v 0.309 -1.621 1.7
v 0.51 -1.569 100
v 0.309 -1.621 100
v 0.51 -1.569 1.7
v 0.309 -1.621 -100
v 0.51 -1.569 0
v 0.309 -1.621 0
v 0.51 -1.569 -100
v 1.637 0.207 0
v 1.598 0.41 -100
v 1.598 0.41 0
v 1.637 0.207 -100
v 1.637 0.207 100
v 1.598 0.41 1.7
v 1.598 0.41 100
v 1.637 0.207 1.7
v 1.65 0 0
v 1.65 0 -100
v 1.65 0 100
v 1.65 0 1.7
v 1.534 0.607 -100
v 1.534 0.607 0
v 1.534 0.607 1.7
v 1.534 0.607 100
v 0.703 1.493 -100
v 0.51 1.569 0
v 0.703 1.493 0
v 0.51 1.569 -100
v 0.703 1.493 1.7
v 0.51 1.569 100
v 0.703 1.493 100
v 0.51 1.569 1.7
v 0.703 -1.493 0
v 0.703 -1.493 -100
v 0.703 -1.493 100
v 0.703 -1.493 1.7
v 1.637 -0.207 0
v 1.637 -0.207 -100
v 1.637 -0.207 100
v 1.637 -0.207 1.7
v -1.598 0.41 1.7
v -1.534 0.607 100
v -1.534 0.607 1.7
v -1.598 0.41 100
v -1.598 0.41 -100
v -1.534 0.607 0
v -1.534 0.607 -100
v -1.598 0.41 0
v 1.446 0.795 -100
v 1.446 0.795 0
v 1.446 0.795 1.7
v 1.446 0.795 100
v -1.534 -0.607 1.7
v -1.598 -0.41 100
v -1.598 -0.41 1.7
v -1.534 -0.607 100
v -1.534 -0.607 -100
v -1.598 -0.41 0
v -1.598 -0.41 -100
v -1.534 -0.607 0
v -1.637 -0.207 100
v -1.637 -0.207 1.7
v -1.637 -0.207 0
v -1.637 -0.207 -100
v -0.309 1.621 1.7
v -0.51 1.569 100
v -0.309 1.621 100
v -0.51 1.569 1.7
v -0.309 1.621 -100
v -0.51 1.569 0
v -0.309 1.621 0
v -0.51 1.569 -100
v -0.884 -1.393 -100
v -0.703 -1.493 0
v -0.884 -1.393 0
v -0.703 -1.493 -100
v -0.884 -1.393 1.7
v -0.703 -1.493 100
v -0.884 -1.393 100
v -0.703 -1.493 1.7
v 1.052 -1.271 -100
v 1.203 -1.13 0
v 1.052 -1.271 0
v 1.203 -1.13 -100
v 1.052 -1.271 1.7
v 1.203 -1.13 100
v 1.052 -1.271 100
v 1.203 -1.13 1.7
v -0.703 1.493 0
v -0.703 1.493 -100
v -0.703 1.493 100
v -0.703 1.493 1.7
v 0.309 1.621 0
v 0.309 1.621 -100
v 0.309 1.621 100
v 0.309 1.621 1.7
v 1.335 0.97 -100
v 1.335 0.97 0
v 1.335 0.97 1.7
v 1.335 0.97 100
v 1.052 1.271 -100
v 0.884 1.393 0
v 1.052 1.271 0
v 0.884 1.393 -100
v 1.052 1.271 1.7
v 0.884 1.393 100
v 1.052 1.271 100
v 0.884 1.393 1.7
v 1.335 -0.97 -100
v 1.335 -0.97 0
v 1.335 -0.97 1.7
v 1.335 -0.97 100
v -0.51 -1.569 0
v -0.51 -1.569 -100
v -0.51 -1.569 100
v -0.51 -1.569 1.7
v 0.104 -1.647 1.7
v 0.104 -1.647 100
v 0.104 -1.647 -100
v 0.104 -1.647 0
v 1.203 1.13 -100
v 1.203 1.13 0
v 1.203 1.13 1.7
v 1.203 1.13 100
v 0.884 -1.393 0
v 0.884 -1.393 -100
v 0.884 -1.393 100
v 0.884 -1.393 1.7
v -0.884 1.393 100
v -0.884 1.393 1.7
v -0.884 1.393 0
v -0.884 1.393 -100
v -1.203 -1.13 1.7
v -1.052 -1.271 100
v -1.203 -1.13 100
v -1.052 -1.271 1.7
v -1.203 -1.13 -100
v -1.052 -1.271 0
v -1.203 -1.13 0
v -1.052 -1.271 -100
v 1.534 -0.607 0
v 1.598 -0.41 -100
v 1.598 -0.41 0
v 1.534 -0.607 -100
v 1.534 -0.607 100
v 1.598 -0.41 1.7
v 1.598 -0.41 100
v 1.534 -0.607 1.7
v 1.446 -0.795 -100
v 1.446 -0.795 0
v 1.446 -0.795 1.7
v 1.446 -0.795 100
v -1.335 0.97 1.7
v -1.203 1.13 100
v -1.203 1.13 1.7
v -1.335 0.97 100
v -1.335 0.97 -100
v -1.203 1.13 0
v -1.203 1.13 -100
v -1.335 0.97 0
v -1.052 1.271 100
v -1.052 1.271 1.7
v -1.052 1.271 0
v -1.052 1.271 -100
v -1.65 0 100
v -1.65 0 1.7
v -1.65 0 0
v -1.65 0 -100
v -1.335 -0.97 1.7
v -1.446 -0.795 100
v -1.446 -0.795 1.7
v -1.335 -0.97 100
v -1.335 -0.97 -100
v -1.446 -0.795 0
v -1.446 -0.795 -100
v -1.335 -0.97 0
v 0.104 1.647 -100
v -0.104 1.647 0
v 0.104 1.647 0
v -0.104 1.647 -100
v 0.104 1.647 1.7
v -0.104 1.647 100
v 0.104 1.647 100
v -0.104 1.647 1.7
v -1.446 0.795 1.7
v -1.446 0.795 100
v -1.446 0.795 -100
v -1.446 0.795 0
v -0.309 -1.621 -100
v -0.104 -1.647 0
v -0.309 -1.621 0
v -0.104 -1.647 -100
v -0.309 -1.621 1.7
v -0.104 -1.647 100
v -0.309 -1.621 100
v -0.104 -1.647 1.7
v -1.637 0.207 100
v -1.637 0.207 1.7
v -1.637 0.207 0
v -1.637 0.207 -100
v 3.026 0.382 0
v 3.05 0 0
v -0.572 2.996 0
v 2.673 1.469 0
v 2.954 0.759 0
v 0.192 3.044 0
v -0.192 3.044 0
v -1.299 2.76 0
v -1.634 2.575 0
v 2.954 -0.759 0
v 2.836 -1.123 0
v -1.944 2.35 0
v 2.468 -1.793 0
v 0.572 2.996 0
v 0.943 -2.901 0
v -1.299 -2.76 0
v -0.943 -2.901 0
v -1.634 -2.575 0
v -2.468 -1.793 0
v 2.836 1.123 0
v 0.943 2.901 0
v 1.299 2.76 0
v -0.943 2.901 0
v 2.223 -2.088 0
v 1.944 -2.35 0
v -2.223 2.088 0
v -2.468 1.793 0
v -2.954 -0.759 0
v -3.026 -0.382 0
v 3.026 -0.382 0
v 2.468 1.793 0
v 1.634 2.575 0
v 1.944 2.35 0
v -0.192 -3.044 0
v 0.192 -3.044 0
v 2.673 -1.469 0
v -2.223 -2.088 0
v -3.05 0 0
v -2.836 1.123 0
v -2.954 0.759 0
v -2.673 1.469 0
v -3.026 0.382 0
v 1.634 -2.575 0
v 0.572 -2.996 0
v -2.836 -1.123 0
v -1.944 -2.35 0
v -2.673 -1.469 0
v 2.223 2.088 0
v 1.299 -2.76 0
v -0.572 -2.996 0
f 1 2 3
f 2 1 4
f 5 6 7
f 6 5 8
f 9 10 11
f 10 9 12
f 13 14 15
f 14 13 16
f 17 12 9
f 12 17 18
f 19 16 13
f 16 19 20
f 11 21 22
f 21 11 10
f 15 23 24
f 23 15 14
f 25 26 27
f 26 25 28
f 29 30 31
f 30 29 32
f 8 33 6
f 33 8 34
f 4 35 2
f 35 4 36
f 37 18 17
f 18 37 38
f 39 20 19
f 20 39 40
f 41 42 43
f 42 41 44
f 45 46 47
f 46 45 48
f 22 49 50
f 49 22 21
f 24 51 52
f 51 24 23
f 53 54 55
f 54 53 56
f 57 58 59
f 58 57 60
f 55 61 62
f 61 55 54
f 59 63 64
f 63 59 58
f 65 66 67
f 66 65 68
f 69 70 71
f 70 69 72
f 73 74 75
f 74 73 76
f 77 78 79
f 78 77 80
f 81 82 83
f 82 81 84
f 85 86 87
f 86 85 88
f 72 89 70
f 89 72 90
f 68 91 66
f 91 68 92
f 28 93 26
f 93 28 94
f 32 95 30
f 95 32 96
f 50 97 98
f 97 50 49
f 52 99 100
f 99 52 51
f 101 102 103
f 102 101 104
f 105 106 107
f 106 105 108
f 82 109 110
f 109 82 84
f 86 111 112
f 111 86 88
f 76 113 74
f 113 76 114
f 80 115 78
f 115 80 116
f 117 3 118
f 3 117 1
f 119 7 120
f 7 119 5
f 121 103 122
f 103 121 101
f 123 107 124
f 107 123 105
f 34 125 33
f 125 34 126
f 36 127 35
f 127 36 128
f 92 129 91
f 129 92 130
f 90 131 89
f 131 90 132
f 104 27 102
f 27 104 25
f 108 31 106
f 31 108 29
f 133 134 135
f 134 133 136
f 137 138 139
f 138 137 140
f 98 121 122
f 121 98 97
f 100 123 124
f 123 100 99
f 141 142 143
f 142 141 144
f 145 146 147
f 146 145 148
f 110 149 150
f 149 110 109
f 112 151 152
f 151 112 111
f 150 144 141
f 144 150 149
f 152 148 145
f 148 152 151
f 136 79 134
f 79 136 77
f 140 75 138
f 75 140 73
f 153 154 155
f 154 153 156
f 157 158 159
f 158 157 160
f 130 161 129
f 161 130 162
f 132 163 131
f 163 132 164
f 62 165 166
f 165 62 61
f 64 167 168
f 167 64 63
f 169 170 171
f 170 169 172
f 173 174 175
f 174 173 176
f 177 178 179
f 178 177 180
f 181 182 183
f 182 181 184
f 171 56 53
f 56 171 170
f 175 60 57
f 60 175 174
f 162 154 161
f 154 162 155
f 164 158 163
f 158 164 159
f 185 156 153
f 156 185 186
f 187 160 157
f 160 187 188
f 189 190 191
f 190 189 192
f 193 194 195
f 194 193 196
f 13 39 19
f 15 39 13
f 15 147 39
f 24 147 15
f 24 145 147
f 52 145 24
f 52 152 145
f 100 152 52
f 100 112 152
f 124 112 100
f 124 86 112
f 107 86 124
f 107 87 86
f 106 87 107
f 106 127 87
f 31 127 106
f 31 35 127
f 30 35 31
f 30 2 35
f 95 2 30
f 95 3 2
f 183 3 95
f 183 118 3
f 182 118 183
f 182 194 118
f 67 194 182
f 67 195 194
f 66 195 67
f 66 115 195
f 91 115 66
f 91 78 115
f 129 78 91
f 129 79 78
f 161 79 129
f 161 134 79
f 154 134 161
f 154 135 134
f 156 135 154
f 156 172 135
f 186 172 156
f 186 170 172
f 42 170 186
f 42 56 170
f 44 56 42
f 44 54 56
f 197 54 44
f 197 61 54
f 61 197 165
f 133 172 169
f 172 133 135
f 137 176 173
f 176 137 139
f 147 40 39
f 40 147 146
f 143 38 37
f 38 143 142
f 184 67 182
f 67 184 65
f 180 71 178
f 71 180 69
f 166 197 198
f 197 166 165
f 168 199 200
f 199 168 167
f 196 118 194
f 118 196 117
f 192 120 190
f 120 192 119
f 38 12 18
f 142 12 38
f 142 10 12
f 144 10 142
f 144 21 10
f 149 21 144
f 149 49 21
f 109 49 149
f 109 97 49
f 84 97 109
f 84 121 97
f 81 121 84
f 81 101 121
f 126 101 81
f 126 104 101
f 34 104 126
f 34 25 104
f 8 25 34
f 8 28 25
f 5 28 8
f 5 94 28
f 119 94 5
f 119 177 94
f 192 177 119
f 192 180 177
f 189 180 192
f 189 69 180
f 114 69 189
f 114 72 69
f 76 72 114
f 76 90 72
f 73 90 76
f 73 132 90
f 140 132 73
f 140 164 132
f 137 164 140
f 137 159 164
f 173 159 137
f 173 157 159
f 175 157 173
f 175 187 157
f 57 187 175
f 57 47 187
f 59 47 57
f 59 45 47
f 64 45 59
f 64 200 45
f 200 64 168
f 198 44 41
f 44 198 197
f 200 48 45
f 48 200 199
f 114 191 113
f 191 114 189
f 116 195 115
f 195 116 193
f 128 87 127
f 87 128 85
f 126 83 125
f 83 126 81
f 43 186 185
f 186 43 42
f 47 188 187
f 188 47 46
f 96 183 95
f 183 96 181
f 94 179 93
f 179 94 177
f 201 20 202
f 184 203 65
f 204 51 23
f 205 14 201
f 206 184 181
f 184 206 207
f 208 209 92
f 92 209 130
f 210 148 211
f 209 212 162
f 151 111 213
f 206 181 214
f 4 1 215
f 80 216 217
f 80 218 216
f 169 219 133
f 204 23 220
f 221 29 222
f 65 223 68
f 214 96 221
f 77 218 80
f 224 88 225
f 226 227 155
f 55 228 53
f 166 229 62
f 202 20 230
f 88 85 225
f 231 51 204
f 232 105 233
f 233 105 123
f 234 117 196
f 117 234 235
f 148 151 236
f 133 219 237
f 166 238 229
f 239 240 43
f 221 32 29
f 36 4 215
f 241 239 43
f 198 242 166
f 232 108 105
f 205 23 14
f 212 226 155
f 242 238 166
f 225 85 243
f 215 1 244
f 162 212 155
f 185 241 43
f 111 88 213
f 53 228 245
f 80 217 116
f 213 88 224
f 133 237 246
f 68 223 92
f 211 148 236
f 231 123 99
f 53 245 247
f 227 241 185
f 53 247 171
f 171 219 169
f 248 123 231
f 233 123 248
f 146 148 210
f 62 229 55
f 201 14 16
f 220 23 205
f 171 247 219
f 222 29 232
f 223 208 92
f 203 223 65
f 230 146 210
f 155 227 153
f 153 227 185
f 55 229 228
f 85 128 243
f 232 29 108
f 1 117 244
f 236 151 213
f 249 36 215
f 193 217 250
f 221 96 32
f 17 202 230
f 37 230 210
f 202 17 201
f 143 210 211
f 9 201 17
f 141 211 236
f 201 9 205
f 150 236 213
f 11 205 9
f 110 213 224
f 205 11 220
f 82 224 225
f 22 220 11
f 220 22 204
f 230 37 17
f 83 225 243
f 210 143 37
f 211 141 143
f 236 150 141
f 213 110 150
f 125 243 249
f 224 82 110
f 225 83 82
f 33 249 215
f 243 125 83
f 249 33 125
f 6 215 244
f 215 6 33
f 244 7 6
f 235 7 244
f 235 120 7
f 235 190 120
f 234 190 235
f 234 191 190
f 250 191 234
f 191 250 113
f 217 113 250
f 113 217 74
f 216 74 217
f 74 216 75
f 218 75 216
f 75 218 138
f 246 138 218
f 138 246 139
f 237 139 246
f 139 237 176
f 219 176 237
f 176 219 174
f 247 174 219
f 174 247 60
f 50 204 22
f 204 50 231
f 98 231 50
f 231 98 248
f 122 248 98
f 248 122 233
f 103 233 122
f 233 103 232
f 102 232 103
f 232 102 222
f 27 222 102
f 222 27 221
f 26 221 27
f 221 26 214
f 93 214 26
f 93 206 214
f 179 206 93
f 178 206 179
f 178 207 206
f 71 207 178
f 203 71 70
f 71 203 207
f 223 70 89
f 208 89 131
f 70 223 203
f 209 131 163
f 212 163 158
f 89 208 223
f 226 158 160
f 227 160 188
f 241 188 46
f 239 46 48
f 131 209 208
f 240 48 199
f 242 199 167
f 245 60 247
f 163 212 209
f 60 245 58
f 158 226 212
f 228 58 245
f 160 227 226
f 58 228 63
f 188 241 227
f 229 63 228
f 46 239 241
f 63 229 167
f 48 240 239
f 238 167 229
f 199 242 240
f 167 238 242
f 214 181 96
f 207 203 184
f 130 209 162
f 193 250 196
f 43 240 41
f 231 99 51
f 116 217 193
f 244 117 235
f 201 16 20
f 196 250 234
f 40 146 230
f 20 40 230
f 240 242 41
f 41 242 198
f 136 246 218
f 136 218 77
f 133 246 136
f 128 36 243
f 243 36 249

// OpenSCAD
$fn = 50;

difference() {
	union() {
		union() {
			translate(v = [0, 0, -100]) {
				cylinder(h = 200, r = 1.65);
			}
			cylinder(h = 1.7, r1 = 3.05, r2 = 1.65);
		}
	}
	union();
}
